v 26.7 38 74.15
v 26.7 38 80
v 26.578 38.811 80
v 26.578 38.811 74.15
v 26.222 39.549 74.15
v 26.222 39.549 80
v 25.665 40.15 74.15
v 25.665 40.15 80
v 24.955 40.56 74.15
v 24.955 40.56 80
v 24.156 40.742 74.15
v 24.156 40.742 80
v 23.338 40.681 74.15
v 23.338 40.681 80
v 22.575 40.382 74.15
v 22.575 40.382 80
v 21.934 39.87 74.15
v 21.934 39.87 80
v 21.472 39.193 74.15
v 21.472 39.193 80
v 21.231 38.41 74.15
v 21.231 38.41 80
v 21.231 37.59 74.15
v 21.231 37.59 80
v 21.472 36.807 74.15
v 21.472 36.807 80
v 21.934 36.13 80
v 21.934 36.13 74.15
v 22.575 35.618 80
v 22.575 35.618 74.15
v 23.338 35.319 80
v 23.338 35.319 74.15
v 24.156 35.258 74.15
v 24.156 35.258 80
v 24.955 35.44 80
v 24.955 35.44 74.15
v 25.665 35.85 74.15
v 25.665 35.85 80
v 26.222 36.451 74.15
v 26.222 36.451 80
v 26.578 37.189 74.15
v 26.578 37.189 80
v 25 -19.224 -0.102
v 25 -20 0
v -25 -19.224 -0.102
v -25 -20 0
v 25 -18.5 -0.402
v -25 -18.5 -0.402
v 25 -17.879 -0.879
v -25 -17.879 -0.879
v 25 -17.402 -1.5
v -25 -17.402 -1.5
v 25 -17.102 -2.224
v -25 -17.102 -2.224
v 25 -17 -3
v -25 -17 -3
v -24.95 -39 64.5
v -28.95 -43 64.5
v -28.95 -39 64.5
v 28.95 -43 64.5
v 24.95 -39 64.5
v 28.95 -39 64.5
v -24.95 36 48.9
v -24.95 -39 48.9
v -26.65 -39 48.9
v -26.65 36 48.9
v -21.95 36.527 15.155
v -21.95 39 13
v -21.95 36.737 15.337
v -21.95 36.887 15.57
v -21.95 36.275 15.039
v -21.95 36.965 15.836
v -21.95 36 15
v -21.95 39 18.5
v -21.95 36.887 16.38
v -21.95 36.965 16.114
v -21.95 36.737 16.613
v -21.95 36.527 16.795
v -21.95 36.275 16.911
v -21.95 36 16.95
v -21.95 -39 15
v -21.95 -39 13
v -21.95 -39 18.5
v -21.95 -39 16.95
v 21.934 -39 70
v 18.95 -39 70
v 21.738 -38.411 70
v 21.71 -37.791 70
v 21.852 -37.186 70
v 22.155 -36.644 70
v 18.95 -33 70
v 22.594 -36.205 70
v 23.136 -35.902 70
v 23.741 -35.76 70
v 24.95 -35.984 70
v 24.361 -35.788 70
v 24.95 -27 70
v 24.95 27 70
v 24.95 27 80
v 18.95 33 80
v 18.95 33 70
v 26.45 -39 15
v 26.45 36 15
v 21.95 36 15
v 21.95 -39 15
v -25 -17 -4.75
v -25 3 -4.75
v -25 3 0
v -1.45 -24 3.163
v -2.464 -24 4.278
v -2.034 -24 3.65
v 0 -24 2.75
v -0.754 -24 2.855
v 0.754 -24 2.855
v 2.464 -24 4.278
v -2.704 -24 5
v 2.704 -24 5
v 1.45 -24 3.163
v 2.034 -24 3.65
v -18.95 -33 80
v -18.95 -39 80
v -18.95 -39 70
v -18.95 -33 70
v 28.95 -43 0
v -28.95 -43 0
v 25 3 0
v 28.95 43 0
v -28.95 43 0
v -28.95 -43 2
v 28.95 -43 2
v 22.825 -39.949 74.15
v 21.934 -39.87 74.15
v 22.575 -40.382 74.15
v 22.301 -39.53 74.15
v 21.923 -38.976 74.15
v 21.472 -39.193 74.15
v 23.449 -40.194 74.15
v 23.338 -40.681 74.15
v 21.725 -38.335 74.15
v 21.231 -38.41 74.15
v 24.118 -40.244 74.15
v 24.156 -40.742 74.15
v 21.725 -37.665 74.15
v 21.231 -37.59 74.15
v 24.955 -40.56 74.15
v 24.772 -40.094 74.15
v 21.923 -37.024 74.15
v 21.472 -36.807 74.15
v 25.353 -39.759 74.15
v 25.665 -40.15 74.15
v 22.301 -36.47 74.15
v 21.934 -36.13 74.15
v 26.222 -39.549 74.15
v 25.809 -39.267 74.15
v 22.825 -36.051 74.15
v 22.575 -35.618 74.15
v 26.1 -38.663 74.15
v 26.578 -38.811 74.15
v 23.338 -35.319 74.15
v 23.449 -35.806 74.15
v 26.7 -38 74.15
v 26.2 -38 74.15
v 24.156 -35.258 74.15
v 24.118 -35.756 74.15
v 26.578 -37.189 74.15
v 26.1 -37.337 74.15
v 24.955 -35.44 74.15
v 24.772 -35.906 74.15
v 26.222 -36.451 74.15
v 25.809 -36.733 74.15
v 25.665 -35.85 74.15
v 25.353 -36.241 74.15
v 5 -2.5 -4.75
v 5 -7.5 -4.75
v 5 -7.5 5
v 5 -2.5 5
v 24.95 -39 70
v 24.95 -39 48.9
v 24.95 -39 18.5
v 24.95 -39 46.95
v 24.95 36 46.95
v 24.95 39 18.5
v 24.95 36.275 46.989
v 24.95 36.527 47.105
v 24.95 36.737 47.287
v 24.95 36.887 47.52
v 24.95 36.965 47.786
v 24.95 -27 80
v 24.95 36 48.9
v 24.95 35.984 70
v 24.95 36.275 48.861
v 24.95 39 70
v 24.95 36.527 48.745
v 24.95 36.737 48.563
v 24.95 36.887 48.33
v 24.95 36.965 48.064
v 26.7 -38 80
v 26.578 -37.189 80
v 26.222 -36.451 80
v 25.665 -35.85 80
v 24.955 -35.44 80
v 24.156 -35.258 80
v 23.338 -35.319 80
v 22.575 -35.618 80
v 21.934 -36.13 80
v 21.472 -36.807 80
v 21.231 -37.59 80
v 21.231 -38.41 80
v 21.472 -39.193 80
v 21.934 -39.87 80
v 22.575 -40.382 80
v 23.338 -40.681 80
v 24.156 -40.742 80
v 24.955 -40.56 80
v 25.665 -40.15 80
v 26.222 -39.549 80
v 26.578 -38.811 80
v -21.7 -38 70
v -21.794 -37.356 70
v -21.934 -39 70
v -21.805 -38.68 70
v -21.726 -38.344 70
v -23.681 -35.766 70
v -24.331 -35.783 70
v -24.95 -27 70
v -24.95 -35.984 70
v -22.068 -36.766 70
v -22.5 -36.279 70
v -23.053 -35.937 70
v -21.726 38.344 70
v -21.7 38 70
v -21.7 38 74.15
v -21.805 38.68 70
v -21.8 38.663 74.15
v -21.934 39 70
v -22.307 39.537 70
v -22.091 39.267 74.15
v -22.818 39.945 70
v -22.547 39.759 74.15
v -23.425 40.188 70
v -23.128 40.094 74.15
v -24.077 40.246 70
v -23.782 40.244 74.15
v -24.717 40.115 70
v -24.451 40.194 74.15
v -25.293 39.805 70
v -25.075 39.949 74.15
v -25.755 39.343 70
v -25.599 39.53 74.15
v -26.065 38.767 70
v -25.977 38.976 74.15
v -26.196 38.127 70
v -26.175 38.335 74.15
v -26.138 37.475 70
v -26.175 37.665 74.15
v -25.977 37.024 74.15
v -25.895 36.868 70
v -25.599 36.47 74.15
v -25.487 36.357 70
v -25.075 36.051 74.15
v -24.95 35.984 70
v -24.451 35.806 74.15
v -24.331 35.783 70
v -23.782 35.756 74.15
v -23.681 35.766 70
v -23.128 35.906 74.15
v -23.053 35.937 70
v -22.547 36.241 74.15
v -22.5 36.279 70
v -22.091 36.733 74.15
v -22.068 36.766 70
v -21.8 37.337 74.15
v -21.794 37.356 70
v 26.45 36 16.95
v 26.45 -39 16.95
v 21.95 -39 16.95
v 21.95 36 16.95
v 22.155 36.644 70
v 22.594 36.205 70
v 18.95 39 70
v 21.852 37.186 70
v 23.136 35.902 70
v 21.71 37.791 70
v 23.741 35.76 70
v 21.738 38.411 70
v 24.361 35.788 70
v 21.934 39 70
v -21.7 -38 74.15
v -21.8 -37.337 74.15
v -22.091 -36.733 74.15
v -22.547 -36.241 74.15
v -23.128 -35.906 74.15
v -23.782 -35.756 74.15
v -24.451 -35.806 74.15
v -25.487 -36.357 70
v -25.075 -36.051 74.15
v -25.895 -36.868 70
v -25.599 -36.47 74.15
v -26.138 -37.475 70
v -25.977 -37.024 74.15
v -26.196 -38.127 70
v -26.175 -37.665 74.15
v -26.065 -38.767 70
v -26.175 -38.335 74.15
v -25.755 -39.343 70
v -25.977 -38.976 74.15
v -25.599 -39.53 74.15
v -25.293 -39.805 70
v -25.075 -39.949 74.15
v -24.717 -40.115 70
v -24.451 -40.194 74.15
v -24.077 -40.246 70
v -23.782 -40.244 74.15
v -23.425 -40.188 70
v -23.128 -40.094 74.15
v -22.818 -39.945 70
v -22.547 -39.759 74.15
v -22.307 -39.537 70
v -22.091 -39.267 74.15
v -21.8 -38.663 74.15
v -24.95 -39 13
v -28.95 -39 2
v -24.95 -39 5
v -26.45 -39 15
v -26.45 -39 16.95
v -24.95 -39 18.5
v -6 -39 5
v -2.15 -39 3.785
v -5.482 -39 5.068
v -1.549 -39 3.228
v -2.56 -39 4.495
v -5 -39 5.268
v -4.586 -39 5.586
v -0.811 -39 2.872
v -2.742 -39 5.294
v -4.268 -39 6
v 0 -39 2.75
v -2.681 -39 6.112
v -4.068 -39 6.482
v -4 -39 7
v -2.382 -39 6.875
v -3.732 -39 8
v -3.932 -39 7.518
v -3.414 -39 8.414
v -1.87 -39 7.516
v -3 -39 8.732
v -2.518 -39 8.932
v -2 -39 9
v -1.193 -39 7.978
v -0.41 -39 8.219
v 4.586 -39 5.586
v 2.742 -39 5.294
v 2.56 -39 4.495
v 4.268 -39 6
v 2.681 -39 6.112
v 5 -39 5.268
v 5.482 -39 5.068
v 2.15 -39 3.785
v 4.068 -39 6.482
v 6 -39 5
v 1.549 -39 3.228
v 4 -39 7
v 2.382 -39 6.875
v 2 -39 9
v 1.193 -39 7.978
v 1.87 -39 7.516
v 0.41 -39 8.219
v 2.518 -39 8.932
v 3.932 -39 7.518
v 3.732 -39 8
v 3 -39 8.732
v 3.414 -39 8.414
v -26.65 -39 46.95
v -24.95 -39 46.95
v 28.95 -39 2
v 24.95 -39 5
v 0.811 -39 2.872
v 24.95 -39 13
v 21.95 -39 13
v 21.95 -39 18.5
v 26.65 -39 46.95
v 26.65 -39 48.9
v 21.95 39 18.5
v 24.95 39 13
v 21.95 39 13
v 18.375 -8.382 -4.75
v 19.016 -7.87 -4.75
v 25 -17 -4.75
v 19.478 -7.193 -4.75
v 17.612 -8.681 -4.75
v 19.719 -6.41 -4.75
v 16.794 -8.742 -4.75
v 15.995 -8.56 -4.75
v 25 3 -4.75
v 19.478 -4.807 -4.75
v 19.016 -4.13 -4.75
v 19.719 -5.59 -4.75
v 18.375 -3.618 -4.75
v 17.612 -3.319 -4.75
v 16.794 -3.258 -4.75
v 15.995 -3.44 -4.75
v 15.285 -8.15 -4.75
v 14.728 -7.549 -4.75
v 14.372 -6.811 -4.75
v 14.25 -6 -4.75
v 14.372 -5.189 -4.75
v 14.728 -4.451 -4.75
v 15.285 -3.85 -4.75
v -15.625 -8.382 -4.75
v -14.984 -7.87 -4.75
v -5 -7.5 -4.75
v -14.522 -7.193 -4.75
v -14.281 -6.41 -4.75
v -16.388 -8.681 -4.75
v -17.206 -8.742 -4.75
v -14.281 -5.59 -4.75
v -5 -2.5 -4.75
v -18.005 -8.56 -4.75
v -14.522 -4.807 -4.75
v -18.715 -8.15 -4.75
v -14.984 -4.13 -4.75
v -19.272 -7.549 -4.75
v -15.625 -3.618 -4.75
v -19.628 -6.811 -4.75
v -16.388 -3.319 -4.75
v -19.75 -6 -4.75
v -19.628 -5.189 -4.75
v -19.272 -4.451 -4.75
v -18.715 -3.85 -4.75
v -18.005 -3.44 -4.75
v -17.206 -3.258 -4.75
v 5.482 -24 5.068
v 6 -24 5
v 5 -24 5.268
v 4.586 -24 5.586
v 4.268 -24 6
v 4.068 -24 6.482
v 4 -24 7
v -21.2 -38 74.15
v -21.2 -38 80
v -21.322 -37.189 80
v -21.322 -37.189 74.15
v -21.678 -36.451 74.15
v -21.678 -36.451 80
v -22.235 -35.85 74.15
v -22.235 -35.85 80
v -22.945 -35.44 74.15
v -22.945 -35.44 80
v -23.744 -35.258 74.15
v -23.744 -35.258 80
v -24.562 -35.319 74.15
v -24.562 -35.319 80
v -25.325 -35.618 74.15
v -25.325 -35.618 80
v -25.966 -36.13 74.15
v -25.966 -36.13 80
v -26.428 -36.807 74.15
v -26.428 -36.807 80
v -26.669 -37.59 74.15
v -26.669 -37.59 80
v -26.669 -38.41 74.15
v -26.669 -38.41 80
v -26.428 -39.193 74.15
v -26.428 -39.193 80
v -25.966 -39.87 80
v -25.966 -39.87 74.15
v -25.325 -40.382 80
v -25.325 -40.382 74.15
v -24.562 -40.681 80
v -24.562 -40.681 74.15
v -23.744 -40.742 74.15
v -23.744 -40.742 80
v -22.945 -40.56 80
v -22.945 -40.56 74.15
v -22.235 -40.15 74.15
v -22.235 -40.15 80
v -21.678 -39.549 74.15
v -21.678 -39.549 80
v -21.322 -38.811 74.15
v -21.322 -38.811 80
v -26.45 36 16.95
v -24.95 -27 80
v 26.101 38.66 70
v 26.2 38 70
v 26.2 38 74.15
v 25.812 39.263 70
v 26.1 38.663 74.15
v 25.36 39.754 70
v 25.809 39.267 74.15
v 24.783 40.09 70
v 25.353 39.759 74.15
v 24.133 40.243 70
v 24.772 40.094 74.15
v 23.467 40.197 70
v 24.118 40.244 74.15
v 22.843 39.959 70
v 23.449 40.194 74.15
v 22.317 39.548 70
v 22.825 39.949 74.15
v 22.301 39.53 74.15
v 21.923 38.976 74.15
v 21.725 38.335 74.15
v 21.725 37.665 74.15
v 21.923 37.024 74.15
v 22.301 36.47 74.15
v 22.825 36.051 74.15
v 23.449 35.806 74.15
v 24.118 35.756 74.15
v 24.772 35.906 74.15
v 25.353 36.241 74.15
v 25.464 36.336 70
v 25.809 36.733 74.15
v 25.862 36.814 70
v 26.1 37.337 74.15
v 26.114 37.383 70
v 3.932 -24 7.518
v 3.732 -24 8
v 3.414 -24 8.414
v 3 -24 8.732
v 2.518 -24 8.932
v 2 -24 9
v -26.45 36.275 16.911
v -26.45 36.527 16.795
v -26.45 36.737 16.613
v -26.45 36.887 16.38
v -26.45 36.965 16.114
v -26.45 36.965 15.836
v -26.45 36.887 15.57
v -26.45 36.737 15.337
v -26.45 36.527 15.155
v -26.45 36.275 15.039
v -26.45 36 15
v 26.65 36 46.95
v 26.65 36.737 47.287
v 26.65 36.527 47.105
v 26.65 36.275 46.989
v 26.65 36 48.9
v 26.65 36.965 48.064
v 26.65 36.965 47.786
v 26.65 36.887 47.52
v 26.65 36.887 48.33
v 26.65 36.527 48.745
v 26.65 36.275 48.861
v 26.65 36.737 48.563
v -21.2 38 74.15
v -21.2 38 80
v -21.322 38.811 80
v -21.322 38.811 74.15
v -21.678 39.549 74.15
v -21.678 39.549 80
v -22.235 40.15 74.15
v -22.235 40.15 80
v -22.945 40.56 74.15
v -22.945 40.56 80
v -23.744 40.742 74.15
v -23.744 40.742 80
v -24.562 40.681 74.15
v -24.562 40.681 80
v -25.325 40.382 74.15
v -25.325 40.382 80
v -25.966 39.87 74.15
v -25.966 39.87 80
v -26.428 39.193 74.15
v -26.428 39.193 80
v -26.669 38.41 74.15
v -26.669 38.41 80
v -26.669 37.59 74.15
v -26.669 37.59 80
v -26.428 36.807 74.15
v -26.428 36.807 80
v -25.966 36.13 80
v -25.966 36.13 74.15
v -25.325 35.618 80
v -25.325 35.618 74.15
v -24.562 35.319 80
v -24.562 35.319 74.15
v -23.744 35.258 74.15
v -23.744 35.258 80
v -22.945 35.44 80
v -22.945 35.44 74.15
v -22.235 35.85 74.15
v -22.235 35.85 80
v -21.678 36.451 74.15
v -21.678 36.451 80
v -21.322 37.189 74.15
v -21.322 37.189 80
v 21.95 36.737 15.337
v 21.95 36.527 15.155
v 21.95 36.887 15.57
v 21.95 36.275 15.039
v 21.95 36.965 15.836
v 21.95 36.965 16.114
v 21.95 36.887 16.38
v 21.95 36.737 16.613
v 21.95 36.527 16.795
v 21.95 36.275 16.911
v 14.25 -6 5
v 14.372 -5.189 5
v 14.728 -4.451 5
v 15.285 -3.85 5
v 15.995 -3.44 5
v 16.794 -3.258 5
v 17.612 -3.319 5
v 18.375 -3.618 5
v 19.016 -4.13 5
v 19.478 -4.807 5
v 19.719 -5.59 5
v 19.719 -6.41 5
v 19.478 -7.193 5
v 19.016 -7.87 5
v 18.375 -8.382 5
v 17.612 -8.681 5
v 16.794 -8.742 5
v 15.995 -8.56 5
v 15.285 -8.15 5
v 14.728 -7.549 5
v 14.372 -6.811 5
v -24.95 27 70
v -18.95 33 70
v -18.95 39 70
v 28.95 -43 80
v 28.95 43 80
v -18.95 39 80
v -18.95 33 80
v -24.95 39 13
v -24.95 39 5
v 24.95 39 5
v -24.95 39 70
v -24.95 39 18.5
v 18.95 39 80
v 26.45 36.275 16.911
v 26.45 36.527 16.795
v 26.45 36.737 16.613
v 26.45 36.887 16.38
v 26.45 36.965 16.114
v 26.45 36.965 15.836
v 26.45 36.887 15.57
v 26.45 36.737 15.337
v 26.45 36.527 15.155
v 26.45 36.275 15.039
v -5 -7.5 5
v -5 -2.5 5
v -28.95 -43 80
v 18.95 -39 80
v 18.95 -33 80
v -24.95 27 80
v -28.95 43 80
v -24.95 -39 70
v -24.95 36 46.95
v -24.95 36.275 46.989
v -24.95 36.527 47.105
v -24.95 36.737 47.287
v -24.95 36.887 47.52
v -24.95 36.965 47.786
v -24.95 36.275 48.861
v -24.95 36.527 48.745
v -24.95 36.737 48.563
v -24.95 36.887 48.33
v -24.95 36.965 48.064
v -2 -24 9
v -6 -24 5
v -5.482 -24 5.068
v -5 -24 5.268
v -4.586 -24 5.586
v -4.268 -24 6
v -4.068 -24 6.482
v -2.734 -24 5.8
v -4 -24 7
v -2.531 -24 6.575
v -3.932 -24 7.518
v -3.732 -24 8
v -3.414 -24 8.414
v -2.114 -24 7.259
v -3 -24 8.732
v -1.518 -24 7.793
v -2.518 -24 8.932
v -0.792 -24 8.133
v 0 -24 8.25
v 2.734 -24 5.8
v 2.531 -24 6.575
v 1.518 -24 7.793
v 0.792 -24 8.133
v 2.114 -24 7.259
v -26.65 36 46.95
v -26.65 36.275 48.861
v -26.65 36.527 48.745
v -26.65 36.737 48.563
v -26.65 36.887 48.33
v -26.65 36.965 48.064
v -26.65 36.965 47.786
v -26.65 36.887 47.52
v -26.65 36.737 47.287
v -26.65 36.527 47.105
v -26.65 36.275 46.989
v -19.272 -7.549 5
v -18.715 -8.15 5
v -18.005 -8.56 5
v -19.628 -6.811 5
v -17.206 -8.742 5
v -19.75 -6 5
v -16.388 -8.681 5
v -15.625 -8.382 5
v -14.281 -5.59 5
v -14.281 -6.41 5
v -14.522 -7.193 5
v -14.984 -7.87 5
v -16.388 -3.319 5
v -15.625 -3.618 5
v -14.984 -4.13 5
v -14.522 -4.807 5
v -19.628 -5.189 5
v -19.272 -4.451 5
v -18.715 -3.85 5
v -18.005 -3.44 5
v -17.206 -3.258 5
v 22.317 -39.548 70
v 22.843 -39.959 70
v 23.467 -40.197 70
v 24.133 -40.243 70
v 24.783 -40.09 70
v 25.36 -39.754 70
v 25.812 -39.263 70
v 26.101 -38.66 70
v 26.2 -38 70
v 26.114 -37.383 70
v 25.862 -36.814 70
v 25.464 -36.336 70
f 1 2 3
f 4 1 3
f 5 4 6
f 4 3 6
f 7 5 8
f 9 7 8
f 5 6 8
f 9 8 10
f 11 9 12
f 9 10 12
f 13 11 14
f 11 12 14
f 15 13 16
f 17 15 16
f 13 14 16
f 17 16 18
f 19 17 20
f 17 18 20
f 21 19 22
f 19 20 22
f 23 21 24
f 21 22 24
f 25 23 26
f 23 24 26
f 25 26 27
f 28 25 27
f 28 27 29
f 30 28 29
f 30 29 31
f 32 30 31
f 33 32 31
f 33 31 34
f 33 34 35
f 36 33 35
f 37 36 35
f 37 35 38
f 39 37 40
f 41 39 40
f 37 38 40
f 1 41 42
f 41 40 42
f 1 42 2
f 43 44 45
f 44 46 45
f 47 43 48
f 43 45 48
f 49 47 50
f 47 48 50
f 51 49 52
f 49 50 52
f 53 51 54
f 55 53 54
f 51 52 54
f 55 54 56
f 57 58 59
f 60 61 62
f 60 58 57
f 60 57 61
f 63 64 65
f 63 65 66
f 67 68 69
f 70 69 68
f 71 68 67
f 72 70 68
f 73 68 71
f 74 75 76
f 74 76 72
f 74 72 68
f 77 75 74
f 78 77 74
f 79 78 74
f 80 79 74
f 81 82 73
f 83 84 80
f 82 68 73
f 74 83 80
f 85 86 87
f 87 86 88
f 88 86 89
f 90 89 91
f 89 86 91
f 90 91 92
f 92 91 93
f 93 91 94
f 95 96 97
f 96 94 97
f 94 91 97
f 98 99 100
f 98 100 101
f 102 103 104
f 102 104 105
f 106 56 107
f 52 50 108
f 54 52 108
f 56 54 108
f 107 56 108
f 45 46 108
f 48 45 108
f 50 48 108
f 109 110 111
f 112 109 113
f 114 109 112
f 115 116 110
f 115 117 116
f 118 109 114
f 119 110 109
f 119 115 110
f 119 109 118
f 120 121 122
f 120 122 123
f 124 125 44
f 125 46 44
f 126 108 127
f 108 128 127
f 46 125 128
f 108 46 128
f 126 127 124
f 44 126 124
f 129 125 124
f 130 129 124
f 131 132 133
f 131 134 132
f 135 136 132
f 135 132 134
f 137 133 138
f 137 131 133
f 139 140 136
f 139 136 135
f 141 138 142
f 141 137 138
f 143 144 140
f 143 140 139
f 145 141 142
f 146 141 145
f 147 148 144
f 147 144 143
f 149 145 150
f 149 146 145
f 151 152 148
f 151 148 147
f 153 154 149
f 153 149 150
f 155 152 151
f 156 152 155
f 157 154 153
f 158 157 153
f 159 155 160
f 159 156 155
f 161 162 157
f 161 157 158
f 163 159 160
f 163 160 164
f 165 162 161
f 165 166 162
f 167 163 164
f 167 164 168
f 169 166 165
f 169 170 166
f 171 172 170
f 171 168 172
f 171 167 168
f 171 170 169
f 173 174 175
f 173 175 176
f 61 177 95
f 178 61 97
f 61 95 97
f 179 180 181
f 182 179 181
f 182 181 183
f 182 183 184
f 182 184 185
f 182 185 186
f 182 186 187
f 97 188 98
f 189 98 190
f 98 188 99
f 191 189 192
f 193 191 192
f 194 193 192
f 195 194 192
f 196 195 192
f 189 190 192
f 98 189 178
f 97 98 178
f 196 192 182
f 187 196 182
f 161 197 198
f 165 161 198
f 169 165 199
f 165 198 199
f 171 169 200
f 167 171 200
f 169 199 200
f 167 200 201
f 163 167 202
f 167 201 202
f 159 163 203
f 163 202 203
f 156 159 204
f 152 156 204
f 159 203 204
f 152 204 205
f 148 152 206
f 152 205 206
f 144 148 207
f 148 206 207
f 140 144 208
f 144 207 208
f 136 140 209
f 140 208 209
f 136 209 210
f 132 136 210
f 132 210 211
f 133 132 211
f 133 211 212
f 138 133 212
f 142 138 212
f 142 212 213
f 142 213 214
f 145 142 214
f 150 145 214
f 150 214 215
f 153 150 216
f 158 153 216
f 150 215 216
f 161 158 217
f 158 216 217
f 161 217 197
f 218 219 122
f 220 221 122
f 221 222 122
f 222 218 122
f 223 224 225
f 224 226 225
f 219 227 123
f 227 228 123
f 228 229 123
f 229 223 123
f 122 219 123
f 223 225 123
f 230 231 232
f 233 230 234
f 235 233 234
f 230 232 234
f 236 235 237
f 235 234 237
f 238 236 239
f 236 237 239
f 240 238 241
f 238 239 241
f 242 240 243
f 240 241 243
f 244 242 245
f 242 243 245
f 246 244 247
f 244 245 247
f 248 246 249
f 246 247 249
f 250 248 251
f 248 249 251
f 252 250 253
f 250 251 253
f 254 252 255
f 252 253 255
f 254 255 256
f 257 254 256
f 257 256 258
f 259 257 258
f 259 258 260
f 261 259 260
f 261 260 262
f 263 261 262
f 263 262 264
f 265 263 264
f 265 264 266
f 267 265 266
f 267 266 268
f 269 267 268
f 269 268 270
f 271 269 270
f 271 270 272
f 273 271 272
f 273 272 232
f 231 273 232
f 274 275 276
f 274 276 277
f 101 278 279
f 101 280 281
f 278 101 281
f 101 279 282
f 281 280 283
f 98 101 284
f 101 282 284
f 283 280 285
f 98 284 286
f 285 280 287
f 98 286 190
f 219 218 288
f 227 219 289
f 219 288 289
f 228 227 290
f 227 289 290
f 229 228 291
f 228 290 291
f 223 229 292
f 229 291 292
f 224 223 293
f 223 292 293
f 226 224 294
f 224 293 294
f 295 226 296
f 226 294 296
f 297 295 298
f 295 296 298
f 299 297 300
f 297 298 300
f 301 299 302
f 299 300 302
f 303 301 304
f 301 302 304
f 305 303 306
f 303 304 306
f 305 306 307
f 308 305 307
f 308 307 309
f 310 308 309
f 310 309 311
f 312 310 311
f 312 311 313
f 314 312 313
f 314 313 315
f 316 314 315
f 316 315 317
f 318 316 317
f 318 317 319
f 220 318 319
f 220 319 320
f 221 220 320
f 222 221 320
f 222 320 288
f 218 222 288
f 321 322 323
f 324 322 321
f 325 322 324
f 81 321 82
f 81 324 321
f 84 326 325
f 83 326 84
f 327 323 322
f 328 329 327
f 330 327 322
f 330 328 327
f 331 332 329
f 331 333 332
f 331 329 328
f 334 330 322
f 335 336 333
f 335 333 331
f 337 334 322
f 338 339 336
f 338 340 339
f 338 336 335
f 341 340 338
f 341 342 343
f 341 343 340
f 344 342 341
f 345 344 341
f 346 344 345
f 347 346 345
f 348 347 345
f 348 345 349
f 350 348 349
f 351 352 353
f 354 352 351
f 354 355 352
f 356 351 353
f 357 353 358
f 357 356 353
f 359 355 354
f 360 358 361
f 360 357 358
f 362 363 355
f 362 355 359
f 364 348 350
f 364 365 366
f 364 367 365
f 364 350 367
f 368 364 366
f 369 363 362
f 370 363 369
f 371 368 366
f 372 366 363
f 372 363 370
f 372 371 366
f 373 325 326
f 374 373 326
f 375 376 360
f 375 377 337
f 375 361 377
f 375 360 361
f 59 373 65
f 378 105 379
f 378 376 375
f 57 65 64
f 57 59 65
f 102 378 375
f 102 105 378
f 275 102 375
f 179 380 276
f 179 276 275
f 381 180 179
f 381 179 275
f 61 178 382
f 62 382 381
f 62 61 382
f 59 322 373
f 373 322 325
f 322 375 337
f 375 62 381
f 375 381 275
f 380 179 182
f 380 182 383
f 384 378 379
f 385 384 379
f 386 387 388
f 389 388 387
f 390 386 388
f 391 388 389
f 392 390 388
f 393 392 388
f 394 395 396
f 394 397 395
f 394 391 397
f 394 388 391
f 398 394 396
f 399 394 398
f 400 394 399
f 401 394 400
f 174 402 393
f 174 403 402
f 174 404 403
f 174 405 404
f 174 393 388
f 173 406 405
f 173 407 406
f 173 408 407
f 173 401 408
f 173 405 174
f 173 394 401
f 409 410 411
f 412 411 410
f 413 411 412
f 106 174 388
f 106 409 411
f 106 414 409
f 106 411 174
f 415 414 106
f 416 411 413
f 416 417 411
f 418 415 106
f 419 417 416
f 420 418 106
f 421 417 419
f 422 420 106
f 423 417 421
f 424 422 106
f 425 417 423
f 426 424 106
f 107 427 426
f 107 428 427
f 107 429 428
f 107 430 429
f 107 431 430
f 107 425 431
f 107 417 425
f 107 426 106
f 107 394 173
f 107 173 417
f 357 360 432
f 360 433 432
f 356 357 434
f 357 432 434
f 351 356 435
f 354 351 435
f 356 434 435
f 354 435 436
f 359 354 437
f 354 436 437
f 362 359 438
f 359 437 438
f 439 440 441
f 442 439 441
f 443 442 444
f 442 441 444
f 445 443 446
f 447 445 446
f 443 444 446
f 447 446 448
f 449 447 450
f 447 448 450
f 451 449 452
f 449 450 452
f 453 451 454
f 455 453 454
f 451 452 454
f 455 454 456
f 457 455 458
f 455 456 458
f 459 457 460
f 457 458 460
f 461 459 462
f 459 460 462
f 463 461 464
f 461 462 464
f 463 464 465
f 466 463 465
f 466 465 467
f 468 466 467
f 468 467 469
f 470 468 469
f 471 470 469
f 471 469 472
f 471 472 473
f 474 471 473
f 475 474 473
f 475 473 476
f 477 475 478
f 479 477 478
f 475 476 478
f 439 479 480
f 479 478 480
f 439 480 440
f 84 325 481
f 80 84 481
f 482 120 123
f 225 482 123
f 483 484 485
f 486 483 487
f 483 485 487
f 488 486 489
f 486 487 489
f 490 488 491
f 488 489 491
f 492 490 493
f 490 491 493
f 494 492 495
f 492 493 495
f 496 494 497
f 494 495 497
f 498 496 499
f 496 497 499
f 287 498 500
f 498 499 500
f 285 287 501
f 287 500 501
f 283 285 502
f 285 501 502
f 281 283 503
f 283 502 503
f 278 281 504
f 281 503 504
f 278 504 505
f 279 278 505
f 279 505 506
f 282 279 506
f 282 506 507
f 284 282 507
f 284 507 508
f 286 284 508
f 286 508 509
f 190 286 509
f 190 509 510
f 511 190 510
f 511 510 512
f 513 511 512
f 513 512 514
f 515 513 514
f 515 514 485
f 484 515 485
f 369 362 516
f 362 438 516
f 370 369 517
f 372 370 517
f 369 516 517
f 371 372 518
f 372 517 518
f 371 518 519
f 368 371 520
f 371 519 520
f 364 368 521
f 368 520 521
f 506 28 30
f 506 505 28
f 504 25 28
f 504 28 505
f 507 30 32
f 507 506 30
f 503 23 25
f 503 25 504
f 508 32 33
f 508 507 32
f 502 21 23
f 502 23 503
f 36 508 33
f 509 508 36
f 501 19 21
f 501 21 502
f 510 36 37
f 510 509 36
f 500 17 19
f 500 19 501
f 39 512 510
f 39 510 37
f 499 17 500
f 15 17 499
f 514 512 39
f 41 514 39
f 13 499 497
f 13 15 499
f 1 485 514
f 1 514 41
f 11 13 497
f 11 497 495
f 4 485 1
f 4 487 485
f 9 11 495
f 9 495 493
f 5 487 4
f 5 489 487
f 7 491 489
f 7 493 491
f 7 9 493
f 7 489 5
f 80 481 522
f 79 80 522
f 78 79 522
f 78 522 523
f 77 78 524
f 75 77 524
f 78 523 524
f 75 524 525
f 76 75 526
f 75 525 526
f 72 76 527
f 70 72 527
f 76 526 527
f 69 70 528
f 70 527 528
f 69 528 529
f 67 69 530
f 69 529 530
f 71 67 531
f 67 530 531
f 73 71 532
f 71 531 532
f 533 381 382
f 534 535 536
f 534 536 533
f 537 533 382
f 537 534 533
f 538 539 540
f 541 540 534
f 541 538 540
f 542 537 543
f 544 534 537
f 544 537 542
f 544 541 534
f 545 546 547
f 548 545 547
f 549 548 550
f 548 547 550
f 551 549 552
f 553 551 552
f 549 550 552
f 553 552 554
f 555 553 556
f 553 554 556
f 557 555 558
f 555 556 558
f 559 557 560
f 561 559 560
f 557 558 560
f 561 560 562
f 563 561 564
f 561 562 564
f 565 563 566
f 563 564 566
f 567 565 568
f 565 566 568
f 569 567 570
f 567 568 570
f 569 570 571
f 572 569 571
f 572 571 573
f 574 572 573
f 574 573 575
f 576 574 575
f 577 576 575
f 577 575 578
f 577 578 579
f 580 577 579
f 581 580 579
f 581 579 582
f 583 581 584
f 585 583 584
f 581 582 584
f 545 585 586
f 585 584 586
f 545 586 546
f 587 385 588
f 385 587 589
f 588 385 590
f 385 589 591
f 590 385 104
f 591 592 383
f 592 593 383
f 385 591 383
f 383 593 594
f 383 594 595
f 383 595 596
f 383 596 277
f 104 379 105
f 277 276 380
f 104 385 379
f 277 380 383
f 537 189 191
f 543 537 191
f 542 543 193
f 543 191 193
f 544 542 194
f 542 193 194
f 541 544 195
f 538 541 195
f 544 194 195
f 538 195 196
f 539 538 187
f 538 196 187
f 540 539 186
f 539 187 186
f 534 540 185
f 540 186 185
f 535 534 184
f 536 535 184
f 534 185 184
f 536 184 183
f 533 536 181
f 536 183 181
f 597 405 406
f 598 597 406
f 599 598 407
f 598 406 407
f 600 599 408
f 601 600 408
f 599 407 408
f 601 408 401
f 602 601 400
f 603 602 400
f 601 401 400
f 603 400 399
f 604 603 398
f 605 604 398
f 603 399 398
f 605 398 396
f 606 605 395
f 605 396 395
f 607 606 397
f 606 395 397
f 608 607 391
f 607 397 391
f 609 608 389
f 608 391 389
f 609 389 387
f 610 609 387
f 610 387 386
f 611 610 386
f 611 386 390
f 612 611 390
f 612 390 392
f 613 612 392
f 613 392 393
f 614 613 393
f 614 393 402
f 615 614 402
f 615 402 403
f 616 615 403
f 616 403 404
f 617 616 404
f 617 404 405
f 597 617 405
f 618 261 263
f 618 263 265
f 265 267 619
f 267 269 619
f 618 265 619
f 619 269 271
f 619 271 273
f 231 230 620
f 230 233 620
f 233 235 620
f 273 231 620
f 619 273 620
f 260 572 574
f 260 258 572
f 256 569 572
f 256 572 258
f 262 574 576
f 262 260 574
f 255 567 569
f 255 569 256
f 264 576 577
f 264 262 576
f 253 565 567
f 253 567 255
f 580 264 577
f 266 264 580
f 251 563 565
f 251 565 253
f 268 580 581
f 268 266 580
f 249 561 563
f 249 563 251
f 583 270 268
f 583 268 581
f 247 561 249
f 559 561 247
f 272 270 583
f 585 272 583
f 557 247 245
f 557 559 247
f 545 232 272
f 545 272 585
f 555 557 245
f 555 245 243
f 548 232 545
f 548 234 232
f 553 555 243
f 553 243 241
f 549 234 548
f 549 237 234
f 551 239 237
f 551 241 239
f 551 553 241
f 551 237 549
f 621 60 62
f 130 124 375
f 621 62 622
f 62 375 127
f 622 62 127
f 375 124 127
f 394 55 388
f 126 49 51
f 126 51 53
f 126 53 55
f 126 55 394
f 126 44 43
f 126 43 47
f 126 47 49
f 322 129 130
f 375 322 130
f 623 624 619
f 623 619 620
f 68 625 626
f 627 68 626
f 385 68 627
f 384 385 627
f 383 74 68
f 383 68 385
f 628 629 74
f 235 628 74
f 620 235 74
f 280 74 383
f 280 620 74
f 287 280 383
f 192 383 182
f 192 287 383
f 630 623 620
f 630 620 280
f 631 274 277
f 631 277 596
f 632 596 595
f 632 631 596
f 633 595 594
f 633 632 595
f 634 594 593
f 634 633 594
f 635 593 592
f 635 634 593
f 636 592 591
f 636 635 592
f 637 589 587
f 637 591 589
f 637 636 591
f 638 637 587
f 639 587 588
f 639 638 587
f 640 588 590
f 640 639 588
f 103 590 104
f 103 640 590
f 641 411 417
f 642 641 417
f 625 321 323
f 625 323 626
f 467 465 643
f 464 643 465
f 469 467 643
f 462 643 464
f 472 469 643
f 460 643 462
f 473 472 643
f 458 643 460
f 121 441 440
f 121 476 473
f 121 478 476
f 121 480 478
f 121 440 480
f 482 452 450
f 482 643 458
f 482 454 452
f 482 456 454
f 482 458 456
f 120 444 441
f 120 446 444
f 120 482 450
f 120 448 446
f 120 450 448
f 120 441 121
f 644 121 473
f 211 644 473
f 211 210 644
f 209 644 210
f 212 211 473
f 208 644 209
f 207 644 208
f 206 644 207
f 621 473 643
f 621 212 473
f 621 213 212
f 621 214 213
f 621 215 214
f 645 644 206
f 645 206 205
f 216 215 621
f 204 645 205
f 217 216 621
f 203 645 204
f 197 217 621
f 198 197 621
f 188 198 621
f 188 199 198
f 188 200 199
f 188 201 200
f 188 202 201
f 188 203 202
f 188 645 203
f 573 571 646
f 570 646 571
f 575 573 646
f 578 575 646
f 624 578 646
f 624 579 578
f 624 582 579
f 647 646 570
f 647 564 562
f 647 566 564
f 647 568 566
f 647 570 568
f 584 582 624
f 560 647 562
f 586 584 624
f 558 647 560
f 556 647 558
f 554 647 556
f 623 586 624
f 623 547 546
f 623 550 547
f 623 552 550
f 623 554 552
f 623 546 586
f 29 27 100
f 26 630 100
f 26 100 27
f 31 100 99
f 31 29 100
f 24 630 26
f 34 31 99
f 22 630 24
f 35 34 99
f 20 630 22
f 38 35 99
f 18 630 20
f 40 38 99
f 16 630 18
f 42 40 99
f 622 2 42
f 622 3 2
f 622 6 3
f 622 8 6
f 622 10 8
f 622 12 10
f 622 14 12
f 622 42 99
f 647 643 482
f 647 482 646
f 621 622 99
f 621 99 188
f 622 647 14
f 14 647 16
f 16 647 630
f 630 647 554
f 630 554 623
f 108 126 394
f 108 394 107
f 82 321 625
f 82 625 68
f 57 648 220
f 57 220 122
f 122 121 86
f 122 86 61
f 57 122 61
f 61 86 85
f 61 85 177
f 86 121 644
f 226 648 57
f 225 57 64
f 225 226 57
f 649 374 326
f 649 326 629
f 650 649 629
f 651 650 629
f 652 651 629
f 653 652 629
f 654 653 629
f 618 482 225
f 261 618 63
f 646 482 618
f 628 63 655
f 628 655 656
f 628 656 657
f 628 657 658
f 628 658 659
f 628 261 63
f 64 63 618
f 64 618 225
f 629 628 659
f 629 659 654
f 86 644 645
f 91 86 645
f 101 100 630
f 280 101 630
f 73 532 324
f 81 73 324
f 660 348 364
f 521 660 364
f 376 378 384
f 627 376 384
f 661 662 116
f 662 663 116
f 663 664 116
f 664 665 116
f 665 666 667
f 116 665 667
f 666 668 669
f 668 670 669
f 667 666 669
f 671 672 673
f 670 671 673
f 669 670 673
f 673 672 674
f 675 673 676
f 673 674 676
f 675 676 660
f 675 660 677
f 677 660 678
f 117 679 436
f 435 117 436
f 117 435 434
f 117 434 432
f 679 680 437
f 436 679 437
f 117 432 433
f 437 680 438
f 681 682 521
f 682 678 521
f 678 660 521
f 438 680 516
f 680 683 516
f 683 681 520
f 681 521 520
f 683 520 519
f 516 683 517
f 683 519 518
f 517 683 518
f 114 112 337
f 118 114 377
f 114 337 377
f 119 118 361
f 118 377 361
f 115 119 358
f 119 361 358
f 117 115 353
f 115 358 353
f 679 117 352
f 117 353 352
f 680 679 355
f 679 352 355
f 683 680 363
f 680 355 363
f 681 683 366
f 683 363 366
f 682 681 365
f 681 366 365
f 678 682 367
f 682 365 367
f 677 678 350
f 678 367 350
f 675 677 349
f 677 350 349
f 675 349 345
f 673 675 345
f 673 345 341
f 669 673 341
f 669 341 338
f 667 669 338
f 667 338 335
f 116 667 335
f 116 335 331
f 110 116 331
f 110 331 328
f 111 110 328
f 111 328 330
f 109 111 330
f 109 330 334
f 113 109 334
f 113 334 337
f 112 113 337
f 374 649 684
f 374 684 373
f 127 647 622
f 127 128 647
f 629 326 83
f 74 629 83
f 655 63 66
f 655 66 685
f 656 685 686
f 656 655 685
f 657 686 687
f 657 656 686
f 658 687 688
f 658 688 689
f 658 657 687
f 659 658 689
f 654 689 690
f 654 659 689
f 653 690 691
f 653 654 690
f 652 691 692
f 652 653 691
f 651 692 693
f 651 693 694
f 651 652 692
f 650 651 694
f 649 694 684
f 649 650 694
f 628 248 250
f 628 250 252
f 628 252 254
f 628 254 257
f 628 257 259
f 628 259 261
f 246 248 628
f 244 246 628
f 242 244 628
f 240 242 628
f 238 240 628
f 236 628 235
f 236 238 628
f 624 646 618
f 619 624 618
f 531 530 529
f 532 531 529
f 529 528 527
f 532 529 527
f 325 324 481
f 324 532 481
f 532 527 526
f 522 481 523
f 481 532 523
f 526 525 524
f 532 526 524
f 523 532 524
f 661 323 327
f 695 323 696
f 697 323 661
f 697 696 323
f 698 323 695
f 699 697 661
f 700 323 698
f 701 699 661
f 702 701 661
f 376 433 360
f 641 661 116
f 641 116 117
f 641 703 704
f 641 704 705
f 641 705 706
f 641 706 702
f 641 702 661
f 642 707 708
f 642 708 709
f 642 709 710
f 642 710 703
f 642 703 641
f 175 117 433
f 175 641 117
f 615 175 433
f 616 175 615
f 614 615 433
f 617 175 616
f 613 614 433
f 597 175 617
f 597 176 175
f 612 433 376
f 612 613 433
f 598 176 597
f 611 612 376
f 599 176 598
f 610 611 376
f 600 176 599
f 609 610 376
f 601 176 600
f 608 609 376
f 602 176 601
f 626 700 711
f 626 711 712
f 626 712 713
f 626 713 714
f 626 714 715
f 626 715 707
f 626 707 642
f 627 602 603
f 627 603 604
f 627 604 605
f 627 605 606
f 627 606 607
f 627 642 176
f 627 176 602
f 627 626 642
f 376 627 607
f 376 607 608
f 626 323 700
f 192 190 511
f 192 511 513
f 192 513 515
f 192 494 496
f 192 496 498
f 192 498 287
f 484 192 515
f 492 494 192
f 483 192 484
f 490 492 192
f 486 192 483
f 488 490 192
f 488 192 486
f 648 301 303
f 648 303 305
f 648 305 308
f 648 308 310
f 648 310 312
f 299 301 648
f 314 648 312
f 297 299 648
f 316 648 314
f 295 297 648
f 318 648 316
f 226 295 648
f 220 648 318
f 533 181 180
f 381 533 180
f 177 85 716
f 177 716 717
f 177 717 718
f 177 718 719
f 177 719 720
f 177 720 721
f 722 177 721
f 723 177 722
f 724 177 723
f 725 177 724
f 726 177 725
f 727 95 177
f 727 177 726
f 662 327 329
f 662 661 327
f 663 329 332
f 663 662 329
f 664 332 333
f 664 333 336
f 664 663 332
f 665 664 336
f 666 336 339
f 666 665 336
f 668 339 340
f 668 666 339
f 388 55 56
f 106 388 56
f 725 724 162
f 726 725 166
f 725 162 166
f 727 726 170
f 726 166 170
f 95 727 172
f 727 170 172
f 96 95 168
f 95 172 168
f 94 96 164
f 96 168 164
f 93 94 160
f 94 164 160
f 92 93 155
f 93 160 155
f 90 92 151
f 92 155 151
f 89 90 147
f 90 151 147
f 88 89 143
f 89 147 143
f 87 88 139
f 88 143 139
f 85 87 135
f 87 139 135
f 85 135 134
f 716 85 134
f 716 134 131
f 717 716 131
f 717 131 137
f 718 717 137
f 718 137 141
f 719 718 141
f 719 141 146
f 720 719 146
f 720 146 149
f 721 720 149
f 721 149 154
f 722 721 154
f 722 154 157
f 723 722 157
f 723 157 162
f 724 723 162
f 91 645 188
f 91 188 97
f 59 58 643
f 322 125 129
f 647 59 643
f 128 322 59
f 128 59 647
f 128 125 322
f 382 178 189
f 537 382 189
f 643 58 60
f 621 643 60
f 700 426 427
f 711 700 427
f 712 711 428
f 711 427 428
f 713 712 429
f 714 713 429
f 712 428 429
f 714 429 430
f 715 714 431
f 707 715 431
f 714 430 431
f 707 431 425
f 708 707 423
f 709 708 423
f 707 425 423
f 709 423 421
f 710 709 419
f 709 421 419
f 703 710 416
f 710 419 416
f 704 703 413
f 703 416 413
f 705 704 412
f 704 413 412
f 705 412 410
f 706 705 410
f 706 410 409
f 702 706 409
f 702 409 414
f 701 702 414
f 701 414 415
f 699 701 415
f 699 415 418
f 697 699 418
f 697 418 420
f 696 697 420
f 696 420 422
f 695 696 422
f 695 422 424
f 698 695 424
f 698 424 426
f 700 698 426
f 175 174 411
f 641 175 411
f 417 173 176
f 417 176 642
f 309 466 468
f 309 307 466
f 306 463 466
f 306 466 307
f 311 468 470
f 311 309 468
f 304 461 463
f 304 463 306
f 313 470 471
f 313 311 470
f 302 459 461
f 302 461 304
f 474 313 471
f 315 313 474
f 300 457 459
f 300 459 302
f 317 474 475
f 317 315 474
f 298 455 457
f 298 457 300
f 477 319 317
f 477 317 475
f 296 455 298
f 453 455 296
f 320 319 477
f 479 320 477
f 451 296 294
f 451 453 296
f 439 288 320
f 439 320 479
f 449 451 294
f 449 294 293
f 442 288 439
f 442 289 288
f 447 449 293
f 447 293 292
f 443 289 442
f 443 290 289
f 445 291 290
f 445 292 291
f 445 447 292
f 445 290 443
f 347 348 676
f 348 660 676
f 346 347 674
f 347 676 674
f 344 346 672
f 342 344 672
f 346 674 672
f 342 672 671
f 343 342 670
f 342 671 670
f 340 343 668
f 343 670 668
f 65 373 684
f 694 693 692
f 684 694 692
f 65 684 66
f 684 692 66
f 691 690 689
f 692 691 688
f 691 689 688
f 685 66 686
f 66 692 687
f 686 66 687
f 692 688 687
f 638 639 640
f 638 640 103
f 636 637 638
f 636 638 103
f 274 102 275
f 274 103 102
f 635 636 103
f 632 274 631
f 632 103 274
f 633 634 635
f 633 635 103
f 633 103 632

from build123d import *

# Parameters (mm, degrees)
ESQUISSE1_W              = 57.9
ESQUISSE1_H              = 86
BOSS_EXTRU_1_DEPTH       = 80
ESQUISSE2_W              = 49.9
ESQUISSE2_H              = 78
ENL_V_MAT_EXTRU_1_DEPTH  = 75
ESQUISSE3_W              = 10
ESQUISSE3_H              = 10
BOSS_EXTRU_2_DEPTH       = 10
ESQUISSE4_R              = 2.75
ENL_V_MAT_EXTRU_2_DEPTH  = 5.85
ESQUISSE47_R             = 2.25
ENL_V_MAT_EXTRU_25_DEPTH = 10
ESQUISSE19_W             = 50
ESQUISSE19_H             = 20
BOSS_EXTRU_9_DEPTH       = 4.75
CONG_1_R                 = 3
ESQUISSE29_W             = 10
ESQUISSE29_H             = 5
ENL_V_MAT_EXTRU_11_DEPTH = 100.346187647
ESQUISSE32_W             = 57.9
ESQUISSE32_H             = 62.5
ENL_V_MAT_EXTRU_16_DEPTH = 4
ESQUISSE46_W             = 3
ESQUISSE46_H             = 5.5
BOSS_EXTRU_10_DEPTH      = 78
ENL_V_START              = -1.5
ENL_V_MAT_EXTRU_20_DEPTH = 11.5
ENL_V_MAT_EXTRU_21_DEPTH = 1.7
CHANFREIN1_SIZE          = 6
ESQUISSE45_R             = 2.75
ENL_V_MAT_EXTRU_24_DEPTH = 100.346187647
ESQUISSE48_W             = 8
ESQUISSE48_H             = 4
BOSS_EXTRU_11_DEPTH      = 15
ESQUISSE49_R             = 2.75
ENL_V_MAT_EXTRU_26_DEPTH = 15
CONG_2_R                 = 2


with BuildPart() as part:
    # Esquisse1 → Boss.-Extru.1 (new body)
    with BuildSketch(Plane.XY):
        Rectangle(ESQUISSE1_W, ESQUISSE1_H)
    extrude(amount=BOSS_EXTRU_1_DEPTH)

    # Esquisse2 → Enlèv. mat.-Extru.1 (cut)
    with BuildSketch(Plane.XY.offset(80)):
        Rectangle(ESQUISSE2_W, ESQUISSE2_H)
    extrude(amount=-ENL_V_MAT_EXTRU_1_DEPTH, mode=Mode.SUBTRACT)

    # Esquisse3 → Boss.-Extru.2 (add)
    with BuildSketch(Plane.XY.offset(80)):
        with Locations((-23.95, 38)):
            Rectangle(ESQUISSE3_W, ESQUISSE3_H)
        with Locations((-23.95, -38)):
            Rectangle(ESQUISSE3_W, ESQUISSE3_H)
        with Locations((23.95, -38)):
            Rectangle(ESQUISSE3_W, ESQUISSE3_H)
        with Locations((23.95, 38)):
            Rectangle(ESQUISSE3_W, ESQUISSE3_H)
    extrude(amount=-BOSS_EXTRU_2_DEPTH)

    # Esquisse4 → Enlèv. mat.-Extru.2 (cut)
    with BuildSketch(Plane.XY.offset(80)):
        with Locations((23.95, -38)):
            Circle(ESQUISSE4_R)
        with Locations((-23.95, -38)):
            Circle(ESQUISSE4_R)
        with Locations((-23.95, 38)):
            Circle(ESQUISSE4_R)
        with Locations((23.95, 38)):
            Circle(ESQUISSE4_R)
    extrude(amount=-ENL_V_MAT_EXTRU_2_DEPTH, mode=Mode.SUBTRACT)

    # Esquisse47 → Enlèv. mat.-Extru.25 (cut)
    with BuildSketch(Plane.XY.offset(80)):
        with Locations((23.95, -38)):
            Circle(ESQUISSE47_R)
        with Locations((-23.95, -38)):
            Circle(ESQUISSE47_R)
        with Locations((-23.95, 38)):
            Circle(ESQUISSE47_R)
        with Locations((23.95, 38)):
            Circle(ESQUISSE47_R)
    extrude(amount=-ENL_V_MAT_EXTRU_25_DEPTH, mode=Mode.SUBTRACT)

    # Esquisse19 → Boss.-Extru.9 (add)
    with BuildSketch(Plane(origin=(0, 0, 0), x_dir=(-1, 0, 0), z_dir=(0, 0, -1))):
        with Locations((0, -7)):
            Rectangle(ESQUISSE19_W, ESQUISSE19_H)
    extrude(amount=BOSS_EXTRU_9_DEPTH)

    # Congé1
    cong_1_edges = [part.edges().sort_by_distance(p)[0] for p in [
        (0, -17, 0),
    ]]
    fillet(cong_1_edges, radius=CONG_1_R)

    # Esquisse29 → Enlèv. mat.-Extru.11 (cut, through all)
    with BuildSketch(Plane(origin=(0, 0, -4.75), x_dir=(-1, 0, 0), z_dir=(0, 0, -1))):
        with Locations((0, -5)):
            Rectangle(ESQUISSE29_W, ESQUISSE29_H)
    extrude(amount=-ENL_V_MAT_EXTRU_11_DEPTH, mode=Mode.SUBTRACT)

    # Esquisse32 → Enlèv. mat.-Extru.16 (cut)
    with BuildSketch(Plane.XZ.offset(43)):
        with Locations((0, 33.25)):
            Rectangle(ESQUISSE32_W, ESQUISSE32_H)
    extrude(amount=-ENL_V_MAT_EXTRU_16_DEPTH, mode=Mode.SUBTRACT)

    # Esquisse46 → Boss.-Extru.10 (add)
    with BuildSketch(Plane.XZ.offset(39)):
        with Locations((-23.45, 15.75)):
            Rectangle(ESQUISSE46_W, ESQUISSE46_H)
    boss_extru_10 = extrude(amount=-BOSS_EXTRU_10_DEPTH)

    # Esquisse38 → Enlèv. mat.-Extru.20 (cut)
    with BuildSketch(Plane(origin=(-24.95, 0, 0), x_dir=(0, 0, -1), z_dir=(1, 0, 0)).offset(ENL_V_START)):
        with BuildLine():
            Line((-16.95, -39), (-16.95, 36))
            ThreePointArc((-16.95, 36), (-15.975, 36.975), (-15, 36))
            Line((-15, 36), (-15, -39))
            ThreePointArc((-15, -39), (-15.975, -39.975), (-16.95, -39))
        make_face()
    enl_v_mat_extru_20 = extrude(amount=ENL_V_MAT_EXTRU_20_DEPTH, mode=Mode.SUBTRACT)

    # Esquisse40 → Enlèv. mat.-Extru.21 (cut)
    with BuildSketch(Plane(origin=(-24.95, 0, 0), x_dir=(0, 0, -1), z_dir=(1, 0, 0))):
        with BuildLine():
            Line((-46.95, 36), (-46.95, -39))
            ThreePointArc((-46.95, -39), (-47.925, -39.975), (-48.9, -39))
            Line((-48.9, -39), (-48.9, 36))
            ThreePointArc((-48.9, 36), (-47.925, 36.975), (-46.95, 36))
        make_face()
    enl_v_mat_extru_21 = extrude(amount=-ENL_V_MAT_EXTRU_21_DEPTH, mode=Mode.SUBTRACT)

    # Chanfrein1
    chanfrein1_edges = [part.edges().sort_by_distance(p)[0] for p in [
        (24.95, -33, 75),
        (-24.95, -33, 75),
        (24.95, 33, 75),
        (-24.95, 33, 75),
    ]]
    chamfer(chanfrein1_edges, length=CHANFREIN1_SIZE - 0.0001)  # a hair under: the kernel refuses the full size

    # Symétrie1: Boss.-Extru.10, Enlèv. mat.-Extru.20, Enlèv. mat.-Extru.21 across plane
    add(boss_extru_10.mirror(Plane(origin=(0, 0, 0), x_dir=(0, 0, 1), z_dir=(1, 0, 0))))
    add(enl_v_mat_extru_20.mirror(Plane(origin=(0, 0, 0), x_dir=(0, 0, 1), z_dir=(1, 0, 0))), mode=Mode.SUBTRACT)
    add(enl_v_mat_extru_21.mirror(Plane(origin=(0, 0, 0), x_dir=(0, 0, 1), z_dir=(1, 0, 0))), mode=Mode.SUBTRACT)

    # Esquisse45 → Enlèv. mat.-Extru.24 (cut, through all)
    with BuildSketch(Plane(origin=(0, 0, -4.75), x_dir=(-1, 0, 0), z_dir=(0, 0, -1))):
        with Locations((17, -6)):
            Circle(ESQUISSE45_R)
        with Locations((-17, -6)):
            Circle(ESQUISSE45_R)
    extrude(amount=-ENL_V_MAT_EXTRU_24_DEPTH, mode=Mode.SUBTRACT)

    # Esquisse48 → Boss.-Extru.11 (add)
    with BuildSketch(Plane.XZ.offset(39)):
        with Locations((0, 7)):
            Rectangle(ESQUISSE48_W, ESQUISSE48_H)
    extrude(amount=-BOSS_EXTRU_11_DEPTH)

    # Esquisse49 → Enlèv. mat.-Extru.26 (cut)
    with BuildSketch(Plane.XZ.offset(39)):
        with Locations(Location((0, 5.5, 0), (0, 0, 270))):
            Circle(ESQUISSE49_R)
    extrude(amount=-ENL_V_MAT_EXTRU_26_DEPTH, mode=Mode.SUBTRACT)

    # Congé2
    cong_2_edges = [part.edges().sort_by_distance(p)[0] for p in [
        (4, -31.5, 5),
        (-4, -31.5, 5),
    ]]
    fillet(cong_2_edges, radius=CONG_2_R)
    cong_2_2_edges = [part.edges().sort_by_distance(p)[0] for p in [
        (4, -31.5, 9),
        (-4, -31.5, 9),
    ]]
    fillet(cong_2_2_edges, radius=CONG_2_R - 0.0001)  # a hair under: the kernel refuses the full size


solid = part.part
